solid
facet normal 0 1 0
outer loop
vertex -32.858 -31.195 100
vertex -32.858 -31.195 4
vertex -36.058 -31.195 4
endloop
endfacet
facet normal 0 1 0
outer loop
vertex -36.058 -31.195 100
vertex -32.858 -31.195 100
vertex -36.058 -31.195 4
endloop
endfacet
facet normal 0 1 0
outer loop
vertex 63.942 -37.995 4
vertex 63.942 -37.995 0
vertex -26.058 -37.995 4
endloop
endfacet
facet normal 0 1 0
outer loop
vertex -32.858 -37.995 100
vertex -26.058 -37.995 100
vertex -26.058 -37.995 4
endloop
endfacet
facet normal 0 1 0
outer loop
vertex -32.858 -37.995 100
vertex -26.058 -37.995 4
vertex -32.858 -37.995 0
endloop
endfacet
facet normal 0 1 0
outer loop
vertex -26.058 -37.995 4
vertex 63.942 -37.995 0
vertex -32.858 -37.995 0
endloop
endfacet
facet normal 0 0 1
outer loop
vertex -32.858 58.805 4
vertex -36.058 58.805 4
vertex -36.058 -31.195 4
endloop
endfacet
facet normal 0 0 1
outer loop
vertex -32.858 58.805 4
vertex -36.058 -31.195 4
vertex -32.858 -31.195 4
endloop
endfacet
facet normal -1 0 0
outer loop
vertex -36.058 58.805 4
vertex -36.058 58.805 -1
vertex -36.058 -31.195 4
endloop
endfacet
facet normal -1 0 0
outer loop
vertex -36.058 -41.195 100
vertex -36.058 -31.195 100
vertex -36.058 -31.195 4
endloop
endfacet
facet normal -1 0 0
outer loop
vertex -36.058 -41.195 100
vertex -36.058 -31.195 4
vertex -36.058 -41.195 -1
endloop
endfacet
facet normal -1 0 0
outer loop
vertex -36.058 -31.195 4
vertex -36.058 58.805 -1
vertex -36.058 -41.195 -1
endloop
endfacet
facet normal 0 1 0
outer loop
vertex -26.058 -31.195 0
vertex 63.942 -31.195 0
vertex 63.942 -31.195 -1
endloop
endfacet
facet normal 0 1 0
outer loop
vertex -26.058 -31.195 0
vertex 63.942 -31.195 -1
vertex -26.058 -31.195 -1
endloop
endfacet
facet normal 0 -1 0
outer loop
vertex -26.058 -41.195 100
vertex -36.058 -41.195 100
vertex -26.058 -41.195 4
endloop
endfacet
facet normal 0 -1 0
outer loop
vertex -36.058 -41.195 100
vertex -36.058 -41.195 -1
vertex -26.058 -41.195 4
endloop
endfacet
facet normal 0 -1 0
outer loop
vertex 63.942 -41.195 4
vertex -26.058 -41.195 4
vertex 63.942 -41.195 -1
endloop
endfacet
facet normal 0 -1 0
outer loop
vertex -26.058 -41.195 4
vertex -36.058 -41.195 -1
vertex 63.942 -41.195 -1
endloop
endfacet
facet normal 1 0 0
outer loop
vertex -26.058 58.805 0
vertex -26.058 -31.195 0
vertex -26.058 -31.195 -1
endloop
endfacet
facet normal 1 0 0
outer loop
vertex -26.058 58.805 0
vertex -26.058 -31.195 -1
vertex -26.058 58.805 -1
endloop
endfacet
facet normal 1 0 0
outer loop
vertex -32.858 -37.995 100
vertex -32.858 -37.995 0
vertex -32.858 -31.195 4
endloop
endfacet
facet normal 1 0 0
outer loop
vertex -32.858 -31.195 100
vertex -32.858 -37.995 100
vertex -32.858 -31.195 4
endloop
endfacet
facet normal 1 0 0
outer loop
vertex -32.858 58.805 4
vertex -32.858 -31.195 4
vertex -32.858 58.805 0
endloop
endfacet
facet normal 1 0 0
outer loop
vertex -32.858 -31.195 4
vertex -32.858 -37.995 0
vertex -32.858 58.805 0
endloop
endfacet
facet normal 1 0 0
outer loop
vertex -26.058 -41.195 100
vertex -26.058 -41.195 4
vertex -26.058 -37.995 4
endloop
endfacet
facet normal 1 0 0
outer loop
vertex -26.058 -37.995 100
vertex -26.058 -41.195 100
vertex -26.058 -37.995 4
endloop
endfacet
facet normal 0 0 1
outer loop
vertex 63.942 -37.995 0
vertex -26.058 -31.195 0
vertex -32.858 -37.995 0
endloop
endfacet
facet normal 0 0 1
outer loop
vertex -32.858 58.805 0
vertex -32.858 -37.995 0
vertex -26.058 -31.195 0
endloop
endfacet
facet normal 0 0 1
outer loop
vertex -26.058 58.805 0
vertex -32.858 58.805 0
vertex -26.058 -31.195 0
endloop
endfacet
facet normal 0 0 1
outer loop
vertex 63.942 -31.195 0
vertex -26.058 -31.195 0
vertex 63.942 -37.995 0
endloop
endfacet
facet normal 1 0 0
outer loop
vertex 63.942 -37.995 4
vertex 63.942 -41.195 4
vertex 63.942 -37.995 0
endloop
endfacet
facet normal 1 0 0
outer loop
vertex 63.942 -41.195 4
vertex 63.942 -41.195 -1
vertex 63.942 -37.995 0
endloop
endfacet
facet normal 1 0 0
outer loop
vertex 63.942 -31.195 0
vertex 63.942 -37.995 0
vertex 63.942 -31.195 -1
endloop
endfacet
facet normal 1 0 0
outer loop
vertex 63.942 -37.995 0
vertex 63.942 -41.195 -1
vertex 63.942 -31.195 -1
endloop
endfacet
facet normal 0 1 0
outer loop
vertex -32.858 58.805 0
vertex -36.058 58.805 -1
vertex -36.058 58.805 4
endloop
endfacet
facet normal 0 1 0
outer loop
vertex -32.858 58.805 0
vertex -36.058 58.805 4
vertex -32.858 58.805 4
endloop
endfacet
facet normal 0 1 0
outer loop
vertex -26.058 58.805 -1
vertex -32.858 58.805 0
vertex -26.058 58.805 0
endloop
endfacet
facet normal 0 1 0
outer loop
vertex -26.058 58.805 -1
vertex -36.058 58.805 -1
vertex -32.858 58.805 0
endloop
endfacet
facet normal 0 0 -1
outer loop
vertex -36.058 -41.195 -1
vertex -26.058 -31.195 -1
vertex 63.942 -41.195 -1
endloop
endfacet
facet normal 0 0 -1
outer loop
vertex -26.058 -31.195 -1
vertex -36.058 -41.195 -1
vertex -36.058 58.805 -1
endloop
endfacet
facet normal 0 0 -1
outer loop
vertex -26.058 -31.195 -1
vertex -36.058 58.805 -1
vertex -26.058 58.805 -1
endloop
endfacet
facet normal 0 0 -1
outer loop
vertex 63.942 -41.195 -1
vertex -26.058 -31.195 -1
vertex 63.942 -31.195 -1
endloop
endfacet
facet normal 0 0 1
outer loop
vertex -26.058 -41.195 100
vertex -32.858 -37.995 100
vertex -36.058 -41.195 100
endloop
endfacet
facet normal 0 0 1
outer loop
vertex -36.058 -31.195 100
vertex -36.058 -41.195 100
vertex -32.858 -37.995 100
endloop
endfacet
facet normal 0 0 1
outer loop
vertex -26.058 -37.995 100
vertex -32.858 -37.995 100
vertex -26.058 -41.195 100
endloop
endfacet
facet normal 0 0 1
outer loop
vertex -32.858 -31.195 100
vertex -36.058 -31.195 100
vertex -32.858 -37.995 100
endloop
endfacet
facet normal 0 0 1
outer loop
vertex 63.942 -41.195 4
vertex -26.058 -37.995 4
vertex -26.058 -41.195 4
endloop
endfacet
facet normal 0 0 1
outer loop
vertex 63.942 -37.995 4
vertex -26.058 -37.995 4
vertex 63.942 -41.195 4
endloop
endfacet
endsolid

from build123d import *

# Parameters (mm, degrees)
F0_W     = 3.2
F0_H     = 90
F0_W_2   = 90
F0_H_2   = 3.2
F1_DEPTH = 1
F2_DEPTH = 4
F3_DEPTH = 100


with BuildPart() as f1:
    # F0 (on Top) → F1 (new body)
    with BuildSketch(Plane.XY):
        with Locations((-34.457693, 13.804672)):
            Rectangle(F0_W, F0_H)
        Polygon((-32.857693, -31.195328), (-36.057693, -31.195328), (-36.057693, -41.195328), (-26.057693, -41.195328), (-26.057693, -37.995328), (-32.857693, -37.995328), align=None)
        Polygon((-26.057693, 58.804672), (-32.857693, 58.804672), (-32.857693, -31.195328), (-26.057693, -37.995328), (63.942307, -37.995328), (63.942307, -31.195328), (-26.057693, -31.195328), align=None)
        with Locations((18.942307, -39.595328)):
            Rectangle(F0_W_2, F0_H_2)
        Polygon((-26.057693, -37.995328), (-32.857693, -31.195328), (-32.857693, -37.995328), align=None)
    extrude(amount=-F1_DEPTH)

    # F0 (on Top) → F2 (join)
    with BuildSketch(Plane.XY):
        with Locations((-34.457693, 13.804672)):
            Rectangle(F0_W, F0_H)
        Polygon((-32.857693, -31.195328), (-36.057693, -31.195328), (-36.057693, -41.195328), (-26.057693, -41.195328), (-26.057693, -37.995328), (-32.857693, -37.995328), align=None)
        with Locations((18.942307, -39.595328)):
            Rectangle(F0_W_2, F0_H_2)
    extrude(amount=F2_DEPTH)

    # F0 (on Top) → F3 (join)
    with BuildSketch(Plane.XY):
        Polygon((-32.857693, -31.195328), (-36.057693, -31.195328), (-36.057693, -41.195328), (-26.057693, -41.195328), (-26.057693, -37.995328), (-32.857693, -37.995328), align=None)
    extrude(amount=F3_DEPTH)


solid = f1.part
